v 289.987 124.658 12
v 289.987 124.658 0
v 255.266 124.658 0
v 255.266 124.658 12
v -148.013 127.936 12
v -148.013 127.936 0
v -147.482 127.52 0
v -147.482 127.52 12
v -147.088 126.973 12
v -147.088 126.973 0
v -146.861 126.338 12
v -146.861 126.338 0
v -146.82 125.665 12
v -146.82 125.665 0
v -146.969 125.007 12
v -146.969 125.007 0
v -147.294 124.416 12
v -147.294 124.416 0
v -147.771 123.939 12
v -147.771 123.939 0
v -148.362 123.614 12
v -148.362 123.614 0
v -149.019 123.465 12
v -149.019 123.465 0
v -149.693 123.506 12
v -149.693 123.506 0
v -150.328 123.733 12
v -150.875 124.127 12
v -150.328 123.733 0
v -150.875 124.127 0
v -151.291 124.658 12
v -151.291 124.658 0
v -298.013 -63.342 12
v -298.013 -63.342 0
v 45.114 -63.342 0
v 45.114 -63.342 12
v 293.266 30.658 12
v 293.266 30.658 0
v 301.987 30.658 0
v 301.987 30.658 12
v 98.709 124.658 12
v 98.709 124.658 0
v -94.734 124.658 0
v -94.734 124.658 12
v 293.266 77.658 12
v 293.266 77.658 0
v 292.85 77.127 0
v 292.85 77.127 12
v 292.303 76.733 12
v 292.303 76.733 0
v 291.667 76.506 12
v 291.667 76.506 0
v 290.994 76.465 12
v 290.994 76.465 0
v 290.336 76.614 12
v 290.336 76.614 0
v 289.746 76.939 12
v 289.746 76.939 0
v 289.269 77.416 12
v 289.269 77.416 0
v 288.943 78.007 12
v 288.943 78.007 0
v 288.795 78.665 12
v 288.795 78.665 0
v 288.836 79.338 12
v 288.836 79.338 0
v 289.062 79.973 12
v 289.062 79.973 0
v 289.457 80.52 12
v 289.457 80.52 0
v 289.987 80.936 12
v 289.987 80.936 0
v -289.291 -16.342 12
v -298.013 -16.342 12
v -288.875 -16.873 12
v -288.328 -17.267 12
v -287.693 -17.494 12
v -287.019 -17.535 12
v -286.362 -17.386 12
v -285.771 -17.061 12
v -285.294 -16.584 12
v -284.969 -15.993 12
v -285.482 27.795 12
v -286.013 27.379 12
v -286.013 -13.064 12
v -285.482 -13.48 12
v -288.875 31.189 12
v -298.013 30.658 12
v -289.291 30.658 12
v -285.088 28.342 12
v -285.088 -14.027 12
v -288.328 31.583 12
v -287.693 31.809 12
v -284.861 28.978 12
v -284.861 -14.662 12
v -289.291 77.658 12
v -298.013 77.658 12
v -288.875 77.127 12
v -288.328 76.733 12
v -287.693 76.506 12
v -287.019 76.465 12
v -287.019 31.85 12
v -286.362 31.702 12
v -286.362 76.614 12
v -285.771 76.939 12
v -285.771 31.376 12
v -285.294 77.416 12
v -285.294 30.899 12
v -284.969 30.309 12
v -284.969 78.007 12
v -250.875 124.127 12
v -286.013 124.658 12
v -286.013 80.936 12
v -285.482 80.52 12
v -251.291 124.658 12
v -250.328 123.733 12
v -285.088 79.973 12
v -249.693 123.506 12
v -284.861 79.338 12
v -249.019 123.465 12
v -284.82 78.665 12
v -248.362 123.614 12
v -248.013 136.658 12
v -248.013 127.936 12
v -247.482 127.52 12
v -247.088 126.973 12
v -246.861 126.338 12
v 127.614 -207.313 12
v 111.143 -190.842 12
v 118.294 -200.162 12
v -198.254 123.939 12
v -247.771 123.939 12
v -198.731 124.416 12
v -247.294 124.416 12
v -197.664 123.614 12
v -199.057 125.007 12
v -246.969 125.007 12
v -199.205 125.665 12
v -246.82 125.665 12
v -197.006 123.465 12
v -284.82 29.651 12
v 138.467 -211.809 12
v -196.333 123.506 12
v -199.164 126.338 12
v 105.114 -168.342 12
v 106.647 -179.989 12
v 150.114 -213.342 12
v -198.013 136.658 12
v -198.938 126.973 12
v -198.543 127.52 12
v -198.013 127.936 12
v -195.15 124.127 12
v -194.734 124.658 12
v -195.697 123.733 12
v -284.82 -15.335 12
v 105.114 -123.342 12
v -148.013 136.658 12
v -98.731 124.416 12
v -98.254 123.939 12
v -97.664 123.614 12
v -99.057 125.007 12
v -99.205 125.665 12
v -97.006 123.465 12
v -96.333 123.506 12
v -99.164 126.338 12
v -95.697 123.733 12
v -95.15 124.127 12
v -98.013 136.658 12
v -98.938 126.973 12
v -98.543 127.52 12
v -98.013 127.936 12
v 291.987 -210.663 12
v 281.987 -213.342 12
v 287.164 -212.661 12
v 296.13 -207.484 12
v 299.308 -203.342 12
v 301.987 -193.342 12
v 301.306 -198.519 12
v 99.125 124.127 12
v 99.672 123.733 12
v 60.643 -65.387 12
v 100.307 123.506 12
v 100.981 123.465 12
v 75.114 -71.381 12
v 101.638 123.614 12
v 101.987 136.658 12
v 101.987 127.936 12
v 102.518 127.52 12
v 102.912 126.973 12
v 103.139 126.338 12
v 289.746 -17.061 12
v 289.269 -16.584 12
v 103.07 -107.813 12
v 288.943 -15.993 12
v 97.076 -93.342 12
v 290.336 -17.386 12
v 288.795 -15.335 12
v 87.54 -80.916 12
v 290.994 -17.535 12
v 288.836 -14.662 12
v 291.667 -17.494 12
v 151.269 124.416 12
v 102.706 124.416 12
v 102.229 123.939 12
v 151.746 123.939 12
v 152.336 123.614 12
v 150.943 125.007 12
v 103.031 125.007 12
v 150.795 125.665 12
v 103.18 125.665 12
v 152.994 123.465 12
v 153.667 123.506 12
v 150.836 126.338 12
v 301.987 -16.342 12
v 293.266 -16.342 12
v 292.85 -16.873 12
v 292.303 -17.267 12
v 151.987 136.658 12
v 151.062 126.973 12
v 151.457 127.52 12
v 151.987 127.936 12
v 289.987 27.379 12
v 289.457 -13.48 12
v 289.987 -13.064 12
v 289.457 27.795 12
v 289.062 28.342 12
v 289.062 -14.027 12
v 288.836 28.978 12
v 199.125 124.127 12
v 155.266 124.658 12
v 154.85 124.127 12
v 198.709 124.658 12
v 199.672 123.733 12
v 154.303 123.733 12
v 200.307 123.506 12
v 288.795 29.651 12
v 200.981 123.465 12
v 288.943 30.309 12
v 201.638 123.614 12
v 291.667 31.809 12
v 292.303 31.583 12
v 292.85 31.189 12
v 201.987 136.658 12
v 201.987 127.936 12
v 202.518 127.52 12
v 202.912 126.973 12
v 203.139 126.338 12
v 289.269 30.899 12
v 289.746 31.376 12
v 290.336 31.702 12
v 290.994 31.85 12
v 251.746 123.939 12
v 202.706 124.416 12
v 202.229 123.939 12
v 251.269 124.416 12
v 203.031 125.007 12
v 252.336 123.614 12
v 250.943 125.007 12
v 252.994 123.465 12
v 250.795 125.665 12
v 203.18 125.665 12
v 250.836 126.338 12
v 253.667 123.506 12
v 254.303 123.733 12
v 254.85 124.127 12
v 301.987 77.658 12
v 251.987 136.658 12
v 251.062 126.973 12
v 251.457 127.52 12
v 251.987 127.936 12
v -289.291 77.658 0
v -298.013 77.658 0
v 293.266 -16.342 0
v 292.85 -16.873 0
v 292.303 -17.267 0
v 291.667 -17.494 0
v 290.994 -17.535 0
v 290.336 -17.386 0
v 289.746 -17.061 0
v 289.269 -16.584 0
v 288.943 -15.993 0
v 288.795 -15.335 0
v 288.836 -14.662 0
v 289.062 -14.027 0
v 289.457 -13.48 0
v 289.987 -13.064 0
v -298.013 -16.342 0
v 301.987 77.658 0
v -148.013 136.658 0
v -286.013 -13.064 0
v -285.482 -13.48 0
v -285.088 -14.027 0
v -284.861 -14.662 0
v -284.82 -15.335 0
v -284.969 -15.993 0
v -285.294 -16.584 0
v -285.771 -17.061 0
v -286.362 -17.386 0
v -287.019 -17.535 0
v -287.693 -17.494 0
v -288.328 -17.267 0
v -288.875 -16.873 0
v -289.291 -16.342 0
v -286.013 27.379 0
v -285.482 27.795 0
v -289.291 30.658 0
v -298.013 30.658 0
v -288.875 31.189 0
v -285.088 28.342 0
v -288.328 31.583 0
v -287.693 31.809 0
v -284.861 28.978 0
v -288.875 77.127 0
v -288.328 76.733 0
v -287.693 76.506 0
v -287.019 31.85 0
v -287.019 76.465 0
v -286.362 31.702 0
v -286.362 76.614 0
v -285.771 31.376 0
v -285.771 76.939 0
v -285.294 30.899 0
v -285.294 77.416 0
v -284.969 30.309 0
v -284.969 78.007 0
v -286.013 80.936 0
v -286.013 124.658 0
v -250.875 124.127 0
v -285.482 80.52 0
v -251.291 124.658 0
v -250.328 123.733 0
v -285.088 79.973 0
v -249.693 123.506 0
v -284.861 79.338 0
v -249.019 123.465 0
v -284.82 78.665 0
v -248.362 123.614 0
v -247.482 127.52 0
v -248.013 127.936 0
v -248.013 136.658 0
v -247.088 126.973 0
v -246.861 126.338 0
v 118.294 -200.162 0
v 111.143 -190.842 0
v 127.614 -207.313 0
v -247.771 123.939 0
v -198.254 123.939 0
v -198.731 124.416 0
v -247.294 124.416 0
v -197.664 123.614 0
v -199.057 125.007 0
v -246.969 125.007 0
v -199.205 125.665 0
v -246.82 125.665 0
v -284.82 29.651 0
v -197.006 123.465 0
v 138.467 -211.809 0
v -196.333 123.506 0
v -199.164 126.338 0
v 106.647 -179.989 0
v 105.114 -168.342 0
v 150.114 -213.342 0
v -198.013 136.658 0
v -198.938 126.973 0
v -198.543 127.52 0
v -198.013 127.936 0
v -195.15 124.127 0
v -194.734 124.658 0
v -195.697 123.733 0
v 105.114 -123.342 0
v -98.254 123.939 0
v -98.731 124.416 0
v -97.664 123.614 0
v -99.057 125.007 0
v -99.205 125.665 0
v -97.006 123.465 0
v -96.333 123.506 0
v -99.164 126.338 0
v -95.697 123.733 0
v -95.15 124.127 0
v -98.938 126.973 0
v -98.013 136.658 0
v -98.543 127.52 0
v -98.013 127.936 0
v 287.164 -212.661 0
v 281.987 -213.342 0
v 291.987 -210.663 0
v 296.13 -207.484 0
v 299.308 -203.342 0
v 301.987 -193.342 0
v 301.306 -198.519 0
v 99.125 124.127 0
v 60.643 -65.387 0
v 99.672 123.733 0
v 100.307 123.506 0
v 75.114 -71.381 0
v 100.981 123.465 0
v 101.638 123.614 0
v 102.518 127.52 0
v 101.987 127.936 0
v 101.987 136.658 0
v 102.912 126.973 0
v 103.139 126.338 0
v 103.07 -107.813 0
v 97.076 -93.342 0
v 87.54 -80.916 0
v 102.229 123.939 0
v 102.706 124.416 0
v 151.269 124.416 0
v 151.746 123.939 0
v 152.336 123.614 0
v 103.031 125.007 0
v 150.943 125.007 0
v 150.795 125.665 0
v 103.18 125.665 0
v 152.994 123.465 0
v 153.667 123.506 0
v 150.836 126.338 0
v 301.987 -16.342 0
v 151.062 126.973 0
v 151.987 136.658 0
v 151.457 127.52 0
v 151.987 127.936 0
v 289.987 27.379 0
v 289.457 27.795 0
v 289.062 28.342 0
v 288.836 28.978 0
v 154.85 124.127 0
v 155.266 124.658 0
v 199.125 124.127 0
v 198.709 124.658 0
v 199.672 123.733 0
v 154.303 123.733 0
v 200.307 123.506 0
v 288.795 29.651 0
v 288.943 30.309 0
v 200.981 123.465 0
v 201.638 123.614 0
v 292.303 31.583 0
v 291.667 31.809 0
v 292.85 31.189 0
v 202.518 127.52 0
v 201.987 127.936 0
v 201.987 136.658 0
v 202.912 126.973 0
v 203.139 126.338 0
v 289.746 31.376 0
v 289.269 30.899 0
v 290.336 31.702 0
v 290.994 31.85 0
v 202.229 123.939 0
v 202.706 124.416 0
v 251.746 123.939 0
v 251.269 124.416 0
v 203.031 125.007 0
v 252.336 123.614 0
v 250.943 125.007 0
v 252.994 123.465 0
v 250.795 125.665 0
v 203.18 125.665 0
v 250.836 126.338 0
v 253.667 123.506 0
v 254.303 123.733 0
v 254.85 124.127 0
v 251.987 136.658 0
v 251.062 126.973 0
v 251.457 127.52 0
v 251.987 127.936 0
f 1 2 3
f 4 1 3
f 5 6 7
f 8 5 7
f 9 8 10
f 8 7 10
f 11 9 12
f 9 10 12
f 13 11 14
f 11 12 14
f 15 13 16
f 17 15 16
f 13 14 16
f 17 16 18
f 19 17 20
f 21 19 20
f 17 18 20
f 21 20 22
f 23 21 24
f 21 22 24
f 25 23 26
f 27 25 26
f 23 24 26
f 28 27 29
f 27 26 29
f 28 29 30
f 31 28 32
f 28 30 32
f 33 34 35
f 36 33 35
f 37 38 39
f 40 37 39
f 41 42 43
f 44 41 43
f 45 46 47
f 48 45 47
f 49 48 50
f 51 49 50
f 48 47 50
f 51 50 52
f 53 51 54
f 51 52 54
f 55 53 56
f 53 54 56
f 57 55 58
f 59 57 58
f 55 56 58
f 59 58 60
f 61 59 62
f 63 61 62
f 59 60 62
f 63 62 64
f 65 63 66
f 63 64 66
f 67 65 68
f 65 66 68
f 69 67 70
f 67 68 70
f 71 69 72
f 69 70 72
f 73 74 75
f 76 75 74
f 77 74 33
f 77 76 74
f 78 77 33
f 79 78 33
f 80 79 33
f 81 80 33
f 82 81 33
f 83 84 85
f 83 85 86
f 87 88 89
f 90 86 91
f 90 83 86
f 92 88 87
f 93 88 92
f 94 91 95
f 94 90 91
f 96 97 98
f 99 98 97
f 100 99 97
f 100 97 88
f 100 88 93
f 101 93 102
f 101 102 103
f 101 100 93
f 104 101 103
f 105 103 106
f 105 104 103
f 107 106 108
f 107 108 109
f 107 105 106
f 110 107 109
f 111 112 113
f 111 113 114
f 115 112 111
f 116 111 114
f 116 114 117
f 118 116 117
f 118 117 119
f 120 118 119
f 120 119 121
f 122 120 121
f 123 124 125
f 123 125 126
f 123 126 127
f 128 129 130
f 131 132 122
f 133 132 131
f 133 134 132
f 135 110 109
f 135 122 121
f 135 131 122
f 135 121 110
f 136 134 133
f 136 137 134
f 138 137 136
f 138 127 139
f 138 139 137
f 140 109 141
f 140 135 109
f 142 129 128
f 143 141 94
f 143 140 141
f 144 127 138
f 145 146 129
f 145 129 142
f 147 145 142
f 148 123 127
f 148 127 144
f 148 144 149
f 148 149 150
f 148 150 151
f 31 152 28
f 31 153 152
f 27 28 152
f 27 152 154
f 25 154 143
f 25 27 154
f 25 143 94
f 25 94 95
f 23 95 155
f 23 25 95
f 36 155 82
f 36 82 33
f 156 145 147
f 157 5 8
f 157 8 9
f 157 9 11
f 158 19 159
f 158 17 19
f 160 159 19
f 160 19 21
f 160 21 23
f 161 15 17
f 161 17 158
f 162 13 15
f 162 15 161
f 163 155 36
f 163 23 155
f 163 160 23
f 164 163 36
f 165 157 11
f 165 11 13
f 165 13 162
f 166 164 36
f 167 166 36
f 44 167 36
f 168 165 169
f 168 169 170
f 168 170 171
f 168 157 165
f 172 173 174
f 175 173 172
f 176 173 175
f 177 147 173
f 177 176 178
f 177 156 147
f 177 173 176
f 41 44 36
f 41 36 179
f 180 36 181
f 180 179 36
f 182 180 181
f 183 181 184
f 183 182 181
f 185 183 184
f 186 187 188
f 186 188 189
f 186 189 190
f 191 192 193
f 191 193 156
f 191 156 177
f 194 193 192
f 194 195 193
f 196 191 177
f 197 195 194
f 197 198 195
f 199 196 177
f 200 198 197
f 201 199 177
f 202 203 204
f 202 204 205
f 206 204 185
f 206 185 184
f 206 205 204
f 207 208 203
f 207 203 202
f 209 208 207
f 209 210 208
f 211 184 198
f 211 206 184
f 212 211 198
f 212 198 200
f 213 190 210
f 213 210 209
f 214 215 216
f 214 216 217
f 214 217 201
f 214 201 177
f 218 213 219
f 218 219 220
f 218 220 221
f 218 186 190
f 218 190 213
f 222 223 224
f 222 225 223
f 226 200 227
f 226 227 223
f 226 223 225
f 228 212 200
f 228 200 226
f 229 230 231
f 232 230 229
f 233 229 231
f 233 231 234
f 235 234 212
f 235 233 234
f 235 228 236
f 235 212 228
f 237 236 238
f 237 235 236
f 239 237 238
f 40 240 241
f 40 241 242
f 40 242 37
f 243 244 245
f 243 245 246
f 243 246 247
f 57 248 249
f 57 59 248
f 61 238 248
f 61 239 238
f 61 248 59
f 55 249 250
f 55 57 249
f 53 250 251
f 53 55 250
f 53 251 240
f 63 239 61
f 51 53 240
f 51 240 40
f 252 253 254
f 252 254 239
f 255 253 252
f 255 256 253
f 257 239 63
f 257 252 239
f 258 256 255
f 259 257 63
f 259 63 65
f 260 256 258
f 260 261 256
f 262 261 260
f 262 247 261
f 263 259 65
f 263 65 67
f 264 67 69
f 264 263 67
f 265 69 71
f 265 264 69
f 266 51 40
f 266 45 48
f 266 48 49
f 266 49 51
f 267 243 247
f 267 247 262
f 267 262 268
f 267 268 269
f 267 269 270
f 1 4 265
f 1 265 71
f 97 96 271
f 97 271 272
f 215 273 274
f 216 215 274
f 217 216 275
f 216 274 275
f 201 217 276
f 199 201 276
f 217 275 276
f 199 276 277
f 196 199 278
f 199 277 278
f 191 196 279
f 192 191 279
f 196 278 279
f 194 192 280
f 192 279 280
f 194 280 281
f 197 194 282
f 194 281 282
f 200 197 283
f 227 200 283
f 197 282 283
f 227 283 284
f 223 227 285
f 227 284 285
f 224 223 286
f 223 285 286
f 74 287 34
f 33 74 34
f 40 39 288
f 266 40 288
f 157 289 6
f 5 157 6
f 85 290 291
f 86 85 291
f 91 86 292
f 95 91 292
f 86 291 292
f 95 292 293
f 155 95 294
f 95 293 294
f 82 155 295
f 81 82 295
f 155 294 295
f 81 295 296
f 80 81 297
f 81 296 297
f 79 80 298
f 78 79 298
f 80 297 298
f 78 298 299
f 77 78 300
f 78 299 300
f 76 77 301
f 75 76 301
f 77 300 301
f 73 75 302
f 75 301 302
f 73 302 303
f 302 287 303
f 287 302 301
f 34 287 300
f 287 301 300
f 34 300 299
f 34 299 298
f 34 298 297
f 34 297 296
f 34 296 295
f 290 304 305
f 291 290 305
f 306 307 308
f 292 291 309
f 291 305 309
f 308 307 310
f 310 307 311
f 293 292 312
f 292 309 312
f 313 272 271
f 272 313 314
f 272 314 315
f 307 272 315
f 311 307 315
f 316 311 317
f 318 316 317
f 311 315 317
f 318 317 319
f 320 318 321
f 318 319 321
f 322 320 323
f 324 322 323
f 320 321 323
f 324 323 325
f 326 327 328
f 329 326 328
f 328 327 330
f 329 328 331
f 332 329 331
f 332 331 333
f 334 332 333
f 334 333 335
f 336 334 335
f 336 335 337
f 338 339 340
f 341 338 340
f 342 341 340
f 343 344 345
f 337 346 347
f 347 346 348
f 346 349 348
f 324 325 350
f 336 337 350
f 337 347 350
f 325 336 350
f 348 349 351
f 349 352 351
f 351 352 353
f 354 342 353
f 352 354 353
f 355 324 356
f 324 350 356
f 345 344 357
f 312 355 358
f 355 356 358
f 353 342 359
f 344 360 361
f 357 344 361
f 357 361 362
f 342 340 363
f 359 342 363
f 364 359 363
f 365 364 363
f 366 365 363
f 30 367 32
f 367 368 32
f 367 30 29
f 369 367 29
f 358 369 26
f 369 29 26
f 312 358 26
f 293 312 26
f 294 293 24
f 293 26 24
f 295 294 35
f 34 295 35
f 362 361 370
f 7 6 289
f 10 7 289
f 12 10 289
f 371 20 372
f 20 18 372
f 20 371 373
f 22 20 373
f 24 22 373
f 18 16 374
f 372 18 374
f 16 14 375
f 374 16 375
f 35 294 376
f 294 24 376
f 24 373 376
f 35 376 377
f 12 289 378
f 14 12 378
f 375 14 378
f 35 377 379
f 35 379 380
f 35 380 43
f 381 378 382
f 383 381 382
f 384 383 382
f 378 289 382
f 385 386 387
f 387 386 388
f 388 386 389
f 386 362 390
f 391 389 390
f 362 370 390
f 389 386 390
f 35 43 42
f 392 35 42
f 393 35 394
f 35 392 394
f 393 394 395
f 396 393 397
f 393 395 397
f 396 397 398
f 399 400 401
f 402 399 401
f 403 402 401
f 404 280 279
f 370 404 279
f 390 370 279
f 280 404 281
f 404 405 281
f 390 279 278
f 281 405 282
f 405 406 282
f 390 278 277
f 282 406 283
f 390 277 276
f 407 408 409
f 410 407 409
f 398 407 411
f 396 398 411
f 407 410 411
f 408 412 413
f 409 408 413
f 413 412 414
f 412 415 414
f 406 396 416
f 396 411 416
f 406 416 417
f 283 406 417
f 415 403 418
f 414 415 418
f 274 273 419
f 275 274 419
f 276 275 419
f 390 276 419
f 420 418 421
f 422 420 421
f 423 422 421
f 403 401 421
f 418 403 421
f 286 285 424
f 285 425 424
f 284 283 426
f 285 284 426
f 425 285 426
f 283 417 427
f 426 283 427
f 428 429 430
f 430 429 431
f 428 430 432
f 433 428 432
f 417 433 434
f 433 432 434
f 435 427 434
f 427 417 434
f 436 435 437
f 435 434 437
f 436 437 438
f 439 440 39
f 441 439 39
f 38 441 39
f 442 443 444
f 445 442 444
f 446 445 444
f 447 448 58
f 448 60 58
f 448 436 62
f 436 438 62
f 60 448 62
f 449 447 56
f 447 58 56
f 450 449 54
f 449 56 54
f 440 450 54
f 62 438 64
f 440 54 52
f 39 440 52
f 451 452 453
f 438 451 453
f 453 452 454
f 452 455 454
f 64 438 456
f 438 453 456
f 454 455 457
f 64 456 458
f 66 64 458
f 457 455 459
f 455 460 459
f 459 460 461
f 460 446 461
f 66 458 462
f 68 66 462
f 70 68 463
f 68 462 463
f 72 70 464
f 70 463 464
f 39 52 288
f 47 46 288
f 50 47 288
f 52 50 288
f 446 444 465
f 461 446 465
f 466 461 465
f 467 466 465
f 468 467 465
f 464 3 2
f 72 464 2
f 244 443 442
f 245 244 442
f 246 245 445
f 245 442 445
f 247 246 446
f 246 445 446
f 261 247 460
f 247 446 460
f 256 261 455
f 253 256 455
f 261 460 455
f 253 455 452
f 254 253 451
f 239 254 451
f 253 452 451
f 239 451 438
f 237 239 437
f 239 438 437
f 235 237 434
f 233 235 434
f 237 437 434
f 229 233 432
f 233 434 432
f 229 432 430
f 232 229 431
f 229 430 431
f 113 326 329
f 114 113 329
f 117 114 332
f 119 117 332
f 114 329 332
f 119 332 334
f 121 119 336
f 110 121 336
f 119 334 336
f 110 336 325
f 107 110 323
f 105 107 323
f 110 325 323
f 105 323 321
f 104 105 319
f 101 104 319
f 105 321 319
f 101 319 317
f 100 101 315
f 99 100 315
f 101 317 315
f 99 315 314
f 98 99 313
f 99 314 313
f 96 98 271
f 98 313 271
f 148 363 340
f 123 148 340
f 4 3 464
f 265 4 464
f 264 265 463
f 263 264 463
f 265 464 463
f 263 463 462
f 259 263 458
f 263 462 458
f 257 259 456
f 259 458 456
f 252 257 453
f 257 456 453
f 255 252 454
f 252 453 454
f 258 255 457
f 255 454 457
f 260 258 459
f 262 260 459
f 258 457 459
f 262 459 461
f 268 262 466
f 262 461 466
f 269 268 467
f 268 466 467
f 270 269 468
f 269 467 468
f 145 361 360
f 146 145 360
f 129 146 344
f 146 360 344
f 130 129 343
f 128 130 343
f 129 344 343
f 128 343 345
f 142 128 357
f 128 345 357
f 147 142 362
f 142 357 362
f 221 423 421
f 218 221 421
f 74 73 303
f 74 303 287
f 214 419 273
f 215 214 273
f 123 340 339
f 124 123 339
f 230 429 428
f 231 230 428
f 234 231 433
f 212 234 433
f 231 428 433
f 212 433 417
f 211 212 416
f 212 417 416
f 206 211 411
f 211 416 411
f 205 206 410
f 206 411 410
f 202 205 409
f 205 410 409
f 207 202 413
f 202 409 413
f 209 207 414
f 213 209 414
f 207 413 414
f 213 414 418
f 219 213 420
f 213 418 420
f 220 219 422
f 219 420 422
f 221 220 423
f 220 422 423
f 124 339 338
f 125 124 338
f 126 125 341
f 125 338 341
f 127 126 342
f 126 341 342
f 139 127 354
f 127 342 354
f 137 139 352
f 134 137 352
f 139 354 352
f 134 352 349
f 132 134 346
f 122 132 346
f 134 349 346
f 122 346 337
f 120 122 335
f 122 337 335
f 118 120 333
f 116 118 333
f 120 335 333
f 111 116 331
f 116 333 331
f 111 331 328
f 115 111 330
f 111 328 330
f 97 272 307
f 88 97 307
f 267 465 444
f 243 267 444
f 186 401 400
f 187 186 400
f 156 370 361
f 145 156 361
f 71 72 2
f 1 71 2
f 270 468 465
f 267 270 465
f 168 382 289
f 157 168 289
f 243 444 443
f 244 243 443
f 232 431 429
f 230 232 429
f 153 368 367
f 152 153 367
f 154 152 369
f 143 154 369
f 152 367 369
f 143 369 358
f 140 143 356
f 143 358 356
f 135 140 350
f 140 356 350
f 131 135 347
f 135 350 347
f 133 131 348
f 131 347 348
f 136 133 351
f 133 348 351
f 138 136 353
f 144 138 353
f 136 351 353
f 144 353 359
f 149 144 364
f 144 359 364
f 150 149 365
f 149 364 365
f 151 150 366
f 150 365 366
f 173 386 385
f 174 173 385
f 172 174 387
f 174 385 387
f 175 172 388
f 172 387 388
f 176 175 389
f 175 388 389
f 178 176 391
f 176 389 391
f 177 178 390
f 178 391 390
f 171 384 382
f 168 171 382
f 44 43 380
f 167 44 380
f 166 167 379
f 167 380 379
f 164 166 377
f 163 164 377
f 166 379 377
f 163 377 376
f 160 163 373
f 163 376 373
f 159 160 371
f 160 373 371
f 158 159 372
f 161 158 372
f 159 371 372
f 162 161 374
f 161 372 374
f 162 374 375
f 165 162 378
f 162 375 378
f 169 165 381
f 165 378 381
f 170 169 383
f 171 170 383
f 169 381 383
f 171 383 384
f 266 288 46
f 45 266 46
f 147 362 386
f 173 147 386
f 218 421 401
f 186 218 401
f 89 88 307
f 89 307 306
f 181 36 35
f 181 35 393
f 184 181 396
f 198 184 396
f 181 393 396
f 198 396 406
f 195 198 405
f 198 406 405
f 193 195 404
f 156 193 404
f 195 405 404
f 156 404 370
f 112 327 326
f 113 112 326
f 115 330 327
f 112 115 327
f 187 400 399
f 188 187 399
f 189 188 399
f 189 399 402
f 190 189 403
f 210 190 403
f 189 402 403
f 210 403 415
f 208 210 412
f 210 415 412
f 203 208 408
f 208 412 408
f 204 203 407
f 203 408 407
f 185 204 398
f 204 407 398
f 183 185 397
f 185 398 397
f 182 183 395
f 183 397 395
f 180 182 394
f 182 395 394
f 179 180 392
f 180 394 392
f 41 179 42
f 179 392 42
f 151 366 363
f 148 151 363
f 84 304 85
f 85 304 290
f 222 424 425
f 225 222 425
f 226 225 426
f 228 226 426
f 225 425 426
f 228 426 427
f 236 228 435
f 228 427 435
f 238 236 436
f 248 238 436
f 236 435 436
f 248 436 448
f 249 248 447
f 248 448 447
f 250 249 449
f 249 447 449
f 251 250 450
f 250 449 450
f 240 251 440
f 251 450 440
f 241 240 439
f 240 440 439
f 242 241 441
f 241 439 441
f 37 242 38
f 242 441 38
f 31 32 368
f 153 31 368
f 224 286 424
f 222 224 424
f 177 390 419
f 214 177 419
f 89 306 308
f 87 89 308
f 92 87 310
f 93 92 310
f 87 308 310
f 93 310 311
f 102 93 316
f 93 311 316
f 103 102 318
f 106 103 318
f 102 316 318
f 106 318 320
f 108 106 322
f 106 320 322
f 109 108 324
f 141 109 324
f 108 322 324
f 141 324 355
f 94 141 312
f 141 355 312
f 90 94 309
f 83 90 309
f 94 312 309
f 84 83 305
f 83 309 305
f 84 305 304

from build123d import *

# Parameters (mm, degrees)
BOSS_EXTRUDE1_DEPTH = 12


with BuildPart() as part:
    # Sketch1 → Boss-Extrude1 (new body)
    with BuildSketch(Plane.XY):
        with BuildLine():
            Line((-298.012610176, -63.342318059), (45.11407446, -63.342318059))
            ThreePointArc((45.11407446, -63.342318059), (87.540481331, -80.915911188), (105.11407446, -123.342318059))
            Line((105.11407446, -123.342318059), (105.11407446, -168.342318059))
            ThreePointArc((105.11407446, -168.342318059), (118.294269306, -200.162123213), (150.11407446, -213.342318059))
            Line((150.11407446, -213.342318059), (277.389007074, -213.342318059))
            Line((277.389007074, -213.342318059), (281.987389824, -213.342318059))
            ThreePointArc((281.987389824, -213.342318059), (296.129525447, -207.484453683), (301.987389824, -193.342318059))
            Line((301.987389824, -193.342318059), (301.987389824, -63.342318059))
            Line((301.987389824, -63.342318059), (301.987389824, -16.342318059))
            Line((301.987389824, -16.342318059), (293.265850793, -16.342318059))
            ThreePointArc((293.265850793, -16.342318059), (289.490333549, -16.839374334), (289.987389824, -13.06385709))
            Line((289.987389824, -13.06385709), (289.987389824, 27.379220972))
            ThreePointArc((289.987389824, 27.379220972), (289.490333549, 31.154738216), (293.265850793, 30.657681941))
            Line((293.265850793, 30.657681941), (301.987389824, 30.657681941))
            Line((301.987389824, 30.657681941), (301.987389824, 77.657681941))
            Line((301.987389824, 77.657681941), (293.265850793, 77.657681941))
            ThreePointArc((293.265850793, 77.657681941), (289.490333549, 77.160625666), (289.987389824, 80.93614291))
            Line((289.987389824, 80.93614291), (289.987389824, 124.657681941))
            Line((289.987389824, 124.657681941), (255.265850793, 124.657681941))
            ThreePointArc((255.265850793, 124.657681941), (251.490333549, 124.160625666), (251.987389824, 127.93614291))
            Line((251.987389824, 127.93614291), (251.987389824, 136.657681941))
            Line((251.987389824, 136.657681941), (201.987389824, 136.657681941))
            Line((201.987389824, 136.657681941), (201.987389824, 127.93614291))
            ThreePointArc((201.987389824, 127.93614291), (202.484446099, 124.160625666), (198.708928855, 124.657681941))
            Line((198.708928855, 124.657681941), (155.265850793, 124.657681941))
            ThreePointArc((155.265850793, 124.657681941), (151.490333549, 124.160625666), (151.987389824, 127.93614291))
            Line((151.987389824, 127.93614291), (151.987389824, 136.657681941))
            Line((151.987389824, 136.657681941), (101.987389824, 136.657681941))
            Line((101.987389824, 136.657681941), (101.987389824, 127.93614291))
            ThreePointArc((101.987389824, 127.93614291), (102.484446099, 124.160625666), (98.708928855, 124.657681941))
            Line((98.708928855, 124.657681941), (-94.734149207, 124.657681941))
            ThreePointArc((-94.734149207, 124.657681941), (-98.509666451, 124.160625666), (-98.012610176, 127.93614291))
            Line((-98.012610176, 127.93614291), (-98.012610176, 136.657681941))
            Line((-98.012610176, 136.657681941), (-148.012610176, 136.657681941))
            Line((-148.012610176, 136.657681941), (-148.012610176, 127.93614291))
            ThreePointArc((-148.012610176, 127.93614291), (-147.515553901, 124.160625666), (-151.291071145, 124.657681941))
            Line((-151.291071145, 124.657681941), (-194.734149207, 124.657681941))
            ThreePointArc((-194.734149207, 124.657681941), (-198.509666451, 124.160625666), (-198.012610176, 127.93614291))
            Line((-198.012610176, 127.93614291), (-198.012610176, 136.657681941))
            Line((-198.012610176, 136.657681941), (-248.012610176, 136.657681941))
            Line((-248.012610176, 136.657681941), (-248.012610176, 127.93614291))
            ThreePointArc((-248.012610176, 127.93614291), (-247.515553901, 124.160625666), (-251.291071145, 124.657681941))
            Line((-251.291071145, 124.657681941), (-286.012610176, 124.657681941))
            Line((-286.012610176, 124.657681941), (-286.012610176, 80.93614291))
            ThreePointArc((-286.012610176, 80.93614291), (-285.515553901, 77.160625666), (-289.291071145, 77.657681941))
            Line((-289.291071145, 77.657681941), (-298.012610176, 77.657681941))
            Line((-298.012610176, 77.657681941), (-298.012610176, 30.657681941))
            Line((-298.012610176, 30.657681941), (-289.291071145, 30.657681941))
            ThreePointArc((-289.291071145, 30.657681941), (-285.515553901, 31.154738216), (-286.012610176, 27.379220972))
            Line((-286.012610176, 27.379220972), (-286.012610176, -13.06385709))
            ThreePointArc((-286.012610176, -13.06385709), (-285.515553901, -16.839374334), (-289.291071145, -16.342318059))
            Line((-289.291071145, -16.342318059), (-298.012610176, -16.342318059))
            Line((-298.012610176, -16.342318059), (-298.012610176, -63.342318059))
        make_face()
    extrude(amount=BOSS_EXTRUDE1_DEPTH)


solid = part.part
